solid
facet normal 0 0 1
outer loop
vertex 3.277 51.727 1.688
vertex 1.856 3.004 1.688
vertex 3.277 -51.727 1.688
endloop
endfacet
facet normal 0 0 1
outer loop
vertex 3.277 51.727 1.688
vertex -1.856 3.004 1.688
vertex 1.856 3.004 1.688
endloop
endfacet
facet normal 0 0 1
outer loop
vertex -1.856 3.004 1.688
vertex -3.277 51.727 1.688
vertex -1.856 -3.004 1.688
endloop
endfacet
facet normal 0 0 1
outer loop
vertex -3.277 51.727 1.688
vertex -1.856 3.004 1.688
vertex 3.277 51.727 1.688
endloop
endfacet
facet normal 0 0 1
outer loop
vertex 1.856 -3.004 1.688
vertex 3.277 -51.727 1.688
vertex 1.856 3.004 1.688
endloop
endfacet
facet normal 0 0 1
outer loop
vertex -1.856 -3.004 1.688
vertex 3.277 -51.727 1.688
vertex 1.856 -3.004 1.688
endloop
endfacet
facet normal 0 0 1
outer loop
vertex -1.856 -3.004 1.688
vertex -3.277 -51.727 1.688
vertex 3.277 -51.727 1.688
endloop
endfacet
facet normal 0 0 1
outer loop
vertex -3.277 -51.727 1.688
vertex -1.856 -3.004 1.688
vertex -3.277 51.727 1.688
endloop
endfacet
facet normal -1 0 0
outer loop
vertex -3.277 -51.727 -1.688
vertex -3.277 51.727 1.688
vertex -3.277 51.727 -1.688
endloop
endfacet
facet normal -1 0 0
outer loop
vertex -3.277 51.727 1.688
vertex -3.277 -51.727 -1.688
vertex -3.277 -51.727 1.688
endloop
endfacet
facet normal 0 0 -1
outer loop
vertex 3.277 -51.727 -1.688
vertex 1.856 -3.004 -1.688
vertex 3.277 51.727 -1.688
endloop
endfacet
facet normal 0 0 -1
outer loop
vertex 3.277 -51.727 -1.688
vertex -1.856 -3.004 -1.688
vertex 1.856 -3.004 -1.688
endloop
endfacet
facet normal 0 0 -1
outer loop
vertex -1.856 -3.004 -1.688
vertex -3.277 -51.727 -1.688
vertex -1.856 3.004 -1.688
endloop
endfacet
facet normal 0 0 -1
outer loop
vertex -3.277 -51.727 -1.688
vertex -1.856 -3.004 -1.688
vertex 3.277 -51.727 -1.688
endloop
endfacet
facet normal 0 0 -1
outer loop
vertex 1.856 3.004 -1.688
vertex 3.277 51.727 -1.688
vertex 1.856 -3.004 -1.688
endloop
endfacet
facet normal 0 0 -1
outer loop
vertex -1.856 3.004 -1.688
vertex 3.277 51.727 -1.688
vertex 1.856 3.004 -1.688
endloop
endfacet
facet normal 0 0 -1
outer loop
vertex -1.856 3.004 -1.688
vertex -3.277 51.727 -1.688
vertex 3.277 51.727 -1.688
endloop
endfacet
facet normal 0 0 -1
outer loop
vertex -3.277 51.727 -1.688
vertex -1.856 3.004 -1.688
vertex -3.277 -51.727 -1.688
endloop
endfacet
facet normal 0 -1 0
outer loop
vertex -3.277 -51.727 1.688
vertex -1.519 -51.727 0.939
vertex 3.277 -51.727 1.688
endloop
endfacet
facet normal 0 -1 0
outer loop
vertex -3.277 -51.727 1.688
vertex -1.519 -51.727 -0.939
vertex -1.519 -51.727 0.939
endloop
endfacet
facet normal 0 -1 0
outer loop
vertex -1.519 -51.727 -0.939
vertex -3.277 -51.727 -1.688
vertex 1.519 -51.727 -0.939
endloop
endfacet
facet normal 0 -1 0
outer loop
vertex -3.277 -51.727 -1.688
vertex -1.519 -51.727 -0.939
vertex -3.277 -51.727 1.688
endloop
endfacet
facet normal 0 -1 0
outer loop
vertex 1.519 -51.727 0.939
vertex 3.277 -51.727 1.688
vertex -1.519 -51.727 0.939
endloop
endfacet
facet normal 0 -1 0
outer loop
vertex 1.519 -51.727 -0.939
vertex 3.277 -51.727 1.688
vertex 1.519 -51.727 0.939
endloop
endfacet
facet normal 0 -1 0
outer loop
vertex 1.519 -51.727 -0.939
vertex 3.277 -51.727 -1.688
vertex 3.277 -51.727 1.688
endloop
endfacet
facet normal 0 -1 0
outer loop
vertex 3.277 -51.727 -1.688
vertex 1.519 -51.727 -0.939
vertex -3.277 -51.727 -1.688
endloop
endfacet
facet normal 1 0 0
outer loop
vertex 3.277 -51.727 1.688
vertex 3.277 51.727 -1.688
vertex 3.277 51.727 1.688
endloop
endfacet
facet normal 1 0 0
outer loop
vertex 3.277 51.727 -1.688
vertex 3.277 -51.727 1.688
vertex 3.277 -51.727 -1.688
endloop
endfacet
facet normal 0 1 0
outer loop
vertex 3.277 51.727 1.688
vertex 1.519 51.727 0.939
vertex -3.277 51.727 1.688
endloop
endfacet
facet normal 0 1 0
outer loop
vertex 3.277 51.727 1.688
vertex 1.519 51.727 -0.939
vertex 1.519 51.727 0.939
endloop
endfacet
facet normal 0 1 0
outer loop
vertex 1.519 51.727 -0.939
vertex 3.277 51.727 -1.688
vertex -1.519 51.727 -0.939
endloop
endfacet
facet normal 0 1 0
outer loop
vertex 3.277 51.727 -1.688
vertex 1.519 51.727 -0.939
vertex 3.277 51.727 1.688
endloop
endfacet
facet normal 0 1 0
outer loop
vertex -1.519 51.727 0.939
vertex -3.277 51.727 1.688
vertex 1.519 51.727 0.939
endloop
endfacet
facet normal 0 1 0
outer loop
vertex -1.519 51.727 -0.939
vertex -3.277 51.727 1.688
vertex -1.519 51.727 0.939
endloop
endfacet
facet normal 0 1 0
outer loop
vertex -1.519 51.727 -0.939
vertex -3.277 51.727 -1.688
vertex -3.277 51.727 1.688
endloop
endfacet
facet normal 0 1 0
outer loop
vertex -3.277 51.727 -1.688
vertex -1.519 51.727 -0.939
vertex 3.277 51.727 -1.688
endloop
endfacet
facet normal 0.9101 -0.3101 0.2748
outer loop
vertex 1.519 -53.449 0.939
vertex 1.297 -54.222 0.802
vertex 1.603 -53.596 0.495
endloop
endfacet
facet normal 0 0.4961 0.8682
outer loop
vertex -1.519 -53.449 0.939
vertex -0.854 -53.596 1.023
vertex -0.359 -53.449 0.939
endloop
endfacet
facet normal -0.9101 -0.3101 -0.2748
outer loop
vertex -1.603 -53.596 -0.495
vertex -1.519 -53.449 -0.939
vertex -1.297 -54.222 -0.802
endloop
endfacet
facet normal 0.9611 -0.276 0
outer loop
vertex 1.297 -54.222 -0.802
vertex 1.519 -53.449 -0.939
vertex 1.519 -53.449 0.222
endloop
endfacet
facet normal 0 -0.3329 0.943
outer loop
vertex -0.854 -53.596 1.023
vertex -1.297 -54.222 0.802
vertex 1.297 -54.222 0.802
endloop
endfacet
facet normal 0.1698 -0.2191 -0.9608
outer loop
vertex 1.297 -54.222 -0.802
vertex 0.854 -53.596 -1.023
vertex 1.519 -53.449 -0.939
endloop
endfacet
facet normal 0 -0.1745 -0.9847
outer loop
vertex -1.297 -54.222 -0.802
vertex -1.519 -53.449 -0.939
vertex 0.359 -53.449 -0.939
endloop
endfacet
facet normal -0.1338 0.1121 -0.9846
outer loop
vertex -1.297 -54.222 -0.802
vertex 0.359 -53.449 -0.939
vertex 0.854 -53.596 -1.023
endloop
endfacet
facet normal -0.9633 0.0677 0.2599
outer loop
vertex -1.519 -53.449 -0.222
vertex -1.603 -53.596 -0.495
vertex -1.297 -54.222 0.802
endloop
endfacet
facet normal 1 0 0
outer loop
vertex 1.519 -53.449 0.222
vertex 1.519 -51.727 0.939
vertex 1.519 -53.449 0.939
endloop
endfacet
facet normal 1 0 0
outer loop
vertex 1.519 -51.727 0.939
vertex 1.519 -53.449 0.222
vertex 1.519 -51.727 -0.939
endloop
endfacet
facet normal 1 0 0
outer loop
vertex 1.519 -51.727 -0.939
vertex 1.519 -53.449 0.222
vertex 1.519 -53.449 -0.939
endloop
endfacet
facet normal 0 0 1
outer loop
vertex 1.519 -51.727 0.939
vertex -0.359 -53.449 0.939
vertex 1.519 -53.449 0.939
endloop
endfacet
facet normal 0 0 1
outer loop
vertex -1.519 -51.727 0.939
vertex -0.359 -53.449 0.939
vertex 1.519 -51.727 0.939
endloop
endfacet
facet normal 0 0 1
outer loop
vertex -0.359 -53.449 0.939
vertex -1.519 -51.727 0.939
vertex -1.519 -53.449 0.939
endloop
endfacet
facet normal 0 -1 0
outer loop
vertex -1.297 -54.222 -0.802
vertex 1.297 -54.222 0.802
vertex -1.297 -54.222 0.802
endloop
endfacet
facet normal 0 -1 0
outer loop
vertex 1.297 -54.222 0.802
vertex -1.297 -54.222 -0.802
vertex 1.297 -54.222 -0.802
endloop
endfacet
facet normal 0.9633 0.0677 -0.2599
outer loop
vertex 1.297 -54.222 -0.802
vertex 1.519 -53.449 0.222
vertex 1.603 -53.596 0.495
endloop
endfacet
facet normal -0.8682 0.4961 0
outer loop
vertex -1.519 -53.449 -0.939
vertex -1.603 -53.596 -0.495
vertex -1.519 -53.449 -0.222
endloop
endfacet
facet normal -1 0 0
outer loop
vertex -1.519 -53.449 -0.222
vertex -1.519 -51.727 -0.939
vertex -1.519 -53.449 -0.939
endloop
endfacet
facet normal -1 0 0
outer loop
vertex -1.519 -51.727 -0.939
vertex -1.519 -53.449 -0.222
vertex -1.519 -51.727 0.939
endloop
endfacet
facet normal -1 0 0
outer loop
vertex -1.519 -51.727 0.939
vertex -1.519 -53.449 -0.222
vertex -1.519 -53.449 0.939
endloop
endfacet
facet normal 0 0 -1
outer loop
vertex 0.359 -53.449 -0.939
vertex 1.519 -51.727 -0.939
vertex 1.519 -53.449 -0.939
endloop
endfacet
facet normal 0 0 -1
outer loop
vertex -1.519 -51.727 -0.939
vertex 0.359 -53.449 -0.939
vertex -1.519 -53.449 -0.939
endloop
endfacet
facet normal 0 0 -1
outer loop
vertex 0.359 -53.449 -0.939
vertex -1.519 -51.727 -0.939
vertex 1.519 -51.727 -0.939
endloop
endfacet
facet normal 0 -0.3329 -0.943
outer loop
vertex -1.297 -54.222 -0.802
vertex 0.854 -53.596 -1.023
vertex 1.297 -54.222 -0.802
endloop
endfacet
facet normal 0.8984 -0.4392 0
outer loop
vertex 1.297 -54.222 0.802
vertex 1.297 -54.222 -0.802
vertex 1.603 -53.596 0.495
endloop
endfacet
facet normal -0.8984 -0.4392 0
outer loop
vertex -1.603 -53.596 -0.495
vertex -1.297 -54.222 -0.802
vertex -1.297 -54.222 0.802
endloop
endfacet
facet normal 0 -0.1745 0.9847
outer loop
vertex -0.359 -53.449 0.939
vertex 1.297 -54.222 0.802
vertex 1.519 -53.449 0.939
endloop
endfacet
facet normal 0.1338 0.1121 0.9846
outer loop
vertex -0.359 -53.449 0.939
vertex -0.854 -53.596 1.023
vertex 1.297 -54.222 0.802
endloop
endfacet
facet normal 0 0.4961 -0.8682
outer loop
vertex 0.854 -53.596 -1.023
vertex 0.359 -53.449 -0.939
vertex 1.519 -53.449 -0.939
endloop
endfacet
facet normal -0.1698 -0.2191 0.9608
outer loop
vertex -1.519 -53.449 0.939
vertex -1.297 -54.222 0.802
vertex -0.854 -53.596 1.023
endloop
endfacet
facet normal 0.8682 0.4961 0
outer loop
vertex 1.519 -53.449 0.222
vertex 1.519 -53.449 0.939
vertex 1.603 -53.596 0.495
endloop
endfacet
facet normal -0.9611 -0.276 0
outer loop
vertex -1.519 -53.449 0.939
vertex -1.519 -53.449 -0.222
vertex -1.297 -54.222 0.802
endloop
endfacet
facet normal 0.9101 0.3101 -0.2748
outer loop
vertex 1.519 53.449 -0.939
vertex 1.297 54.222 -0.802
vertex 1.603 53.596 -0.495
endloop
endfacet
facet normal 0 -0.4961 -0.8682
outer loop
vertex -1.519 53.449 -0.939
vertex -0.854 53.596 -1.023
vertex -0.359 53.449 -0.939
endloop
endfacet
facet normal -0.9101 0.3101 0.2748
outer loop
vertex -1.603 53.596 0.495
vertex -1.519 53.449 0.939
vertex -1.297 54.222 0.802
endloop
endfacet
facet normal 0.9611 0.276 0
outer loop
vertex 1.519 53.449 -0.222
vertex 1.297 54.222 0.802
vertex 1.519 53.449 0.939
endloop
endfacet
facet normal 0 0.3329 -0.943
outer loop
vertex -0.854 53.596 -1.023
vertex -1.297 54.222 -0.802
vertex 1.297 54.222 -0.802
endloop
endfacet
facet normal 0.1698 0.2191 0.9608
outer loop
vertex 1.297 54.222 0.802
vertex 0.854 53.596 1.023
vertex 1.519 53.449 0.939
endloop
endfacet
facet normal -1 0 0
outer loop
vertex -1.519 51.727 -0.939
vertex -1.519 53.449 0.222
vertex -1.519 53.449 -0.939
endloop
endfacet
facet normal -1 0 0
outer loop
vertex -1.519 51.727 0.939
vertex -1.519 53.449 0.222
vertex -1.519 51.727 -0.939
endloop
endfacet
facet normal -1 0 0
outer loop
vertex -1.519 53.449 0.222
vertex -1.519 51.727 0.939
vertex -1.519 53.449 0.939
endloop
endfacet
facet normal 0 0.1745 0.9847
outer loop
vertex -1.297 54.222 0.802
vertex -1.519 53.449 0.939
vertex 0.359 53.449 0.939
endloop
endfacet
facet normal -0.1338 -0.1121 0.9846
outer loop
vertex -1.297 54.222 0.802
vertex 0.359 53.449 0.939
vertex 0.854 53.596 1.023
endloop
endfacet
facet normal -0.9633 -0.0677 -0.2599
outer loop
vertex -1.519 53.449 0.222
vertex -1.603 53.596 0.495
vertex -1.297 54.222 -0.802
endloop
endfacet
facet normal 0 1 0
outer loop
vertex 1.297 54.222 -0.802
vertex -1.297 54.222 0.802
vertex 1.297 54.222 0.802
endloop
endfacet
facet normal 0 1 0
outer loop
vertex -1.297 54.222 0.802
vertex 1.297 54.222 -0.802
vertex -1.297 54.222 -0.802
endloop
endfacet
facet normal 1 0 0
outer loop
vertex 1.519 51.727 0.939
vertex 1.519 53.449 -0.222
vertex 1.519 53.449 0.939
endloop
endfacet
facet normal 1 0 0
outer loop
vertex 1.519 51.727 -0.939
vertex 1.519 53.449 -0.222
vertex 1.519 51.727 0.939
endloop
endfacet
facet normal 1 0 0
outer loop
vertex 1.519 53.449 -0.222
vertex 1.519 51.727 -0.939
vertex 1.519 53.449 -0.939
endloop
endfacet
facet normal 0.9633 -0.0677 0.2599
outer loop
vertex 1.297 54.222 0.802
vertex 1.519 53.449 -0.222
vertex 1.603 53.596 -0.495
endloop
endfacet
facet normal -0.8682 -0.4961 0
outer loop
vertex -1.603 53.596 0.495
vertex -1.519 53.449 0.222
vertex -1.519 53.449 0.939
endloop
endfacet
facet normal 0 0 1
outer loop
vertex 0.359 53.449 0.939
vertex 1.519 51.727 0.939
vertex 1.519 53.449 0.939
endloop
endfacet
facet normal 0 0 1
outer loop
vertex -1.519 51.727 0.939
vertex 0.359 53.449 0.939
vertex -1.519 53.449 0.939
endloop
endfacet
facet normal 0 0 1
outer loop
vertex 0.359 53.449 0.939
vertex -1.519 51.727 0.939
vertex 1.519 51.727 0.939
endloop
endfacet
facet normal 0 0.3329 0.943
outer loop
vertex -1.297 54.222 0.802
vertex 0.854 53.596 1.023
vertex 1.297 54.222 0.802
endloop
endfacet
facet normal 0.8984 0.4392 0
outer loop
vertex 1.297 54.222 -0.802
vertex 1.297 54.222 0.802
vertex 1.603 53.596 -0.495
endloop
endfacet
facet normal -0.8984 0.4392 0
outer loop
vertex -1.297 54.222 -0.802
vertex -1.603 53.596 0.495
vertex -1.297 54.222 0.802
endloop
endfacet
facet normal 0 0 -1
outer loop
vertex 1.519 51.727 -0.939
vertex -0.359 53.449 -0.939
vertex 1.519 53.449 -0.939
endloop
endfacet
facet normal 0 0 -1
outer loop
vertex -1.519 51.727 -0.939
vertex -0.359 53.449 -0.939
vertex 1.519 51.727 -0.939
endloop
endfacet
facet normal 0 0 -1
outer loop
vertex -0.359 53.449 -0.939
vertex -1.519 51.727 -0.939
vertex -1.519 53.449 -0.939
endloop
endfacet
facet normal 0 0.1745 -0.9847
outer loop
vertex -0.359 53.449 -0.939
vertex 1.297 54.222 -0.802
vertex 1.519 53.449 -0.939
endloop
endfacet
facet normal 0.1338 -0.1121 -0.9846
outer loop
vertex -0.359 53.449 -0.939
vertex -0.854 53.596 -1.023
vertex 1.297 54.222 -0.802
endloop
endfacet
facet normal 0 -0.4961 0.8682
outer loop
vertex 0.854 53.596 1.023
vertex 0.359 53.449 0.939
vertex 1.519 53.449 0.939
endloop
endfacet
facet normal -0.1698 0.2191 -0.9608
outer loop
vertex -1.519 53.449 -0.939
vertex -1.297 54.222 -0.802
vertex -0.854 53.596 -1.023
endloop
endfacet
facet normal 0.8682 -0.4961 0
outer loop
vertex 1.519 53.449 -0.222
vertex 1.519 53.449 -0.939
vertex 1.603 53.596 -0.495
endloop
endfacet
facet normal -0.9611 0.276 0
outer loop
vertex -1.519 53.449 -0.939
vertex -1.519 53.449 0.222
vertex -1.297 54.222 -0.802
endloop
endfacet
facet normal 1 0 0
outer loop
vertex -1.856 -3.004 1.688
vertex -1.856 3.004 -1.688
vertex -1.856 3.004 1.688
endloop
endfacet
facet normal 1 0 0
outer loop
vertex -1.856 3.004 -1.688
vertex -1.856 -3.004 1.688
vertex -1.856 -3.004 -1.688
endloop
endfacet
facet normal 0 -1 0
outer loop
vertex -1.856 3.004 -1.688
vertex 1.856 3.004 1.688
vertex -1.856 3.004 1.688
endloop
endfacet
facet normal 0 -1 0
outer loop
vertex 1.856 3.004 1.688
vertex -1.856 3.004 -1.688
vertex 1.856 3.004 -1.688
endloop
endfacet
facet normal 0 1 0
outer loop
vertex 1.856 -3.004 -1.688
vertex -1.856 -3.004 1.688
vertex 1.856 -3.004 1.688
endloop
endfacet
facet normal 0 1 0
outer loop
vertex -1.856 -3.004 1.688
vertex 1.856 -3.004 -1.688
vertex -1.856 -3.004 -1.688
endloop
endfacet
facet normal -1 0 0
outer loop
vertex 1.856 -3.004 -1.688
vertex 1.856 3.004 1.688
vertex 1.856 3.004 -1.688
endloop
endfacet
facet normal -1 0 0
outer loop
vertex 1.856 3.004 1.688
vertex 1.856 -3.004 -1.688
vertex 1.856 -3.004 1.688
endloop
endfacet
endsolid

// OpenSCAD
sc=(4+2*sqrt(5))/cos(16.5);
points=[[ -0.309016994374947, -0.190983005625053, -5.85410196624968 ],[ -0.309016994374947, -0.190983005625053, 5.85410196624968 ],[ -0.309016994374947, 0.190983005625053, -5.85410196624968 ],[ -0.309016994374947, 0.190983005625053, 5.85410196624968 ],[ -0.201626123751154, -0.0623058987490541, 6.25328890437411 ],[ -0.190983005625053, -4.23606797749979, -0.309016994374947 ],[ -0.190983005625053, -4.23606797749979, 0.309016994374947 ],[ -0.190983005625053, -0.118033988749895, 5.85410196624968 ],[ -0.190983005625053, -0.118033988749895, 6.23606797749979 ],[ -0.190983005625053, -0.0278640450004204, 6.23606797749979 ],[ -0.190983005625053, 0.118033988749895, 5.85410196624968 ],[ -0.190983005625053, 0.118033988749895, 6.23606797749979 ],[ -0.190983005625053, 4.23606797749979, -0.309016994374947 ],[ -0.190983005625053, 4.23606797749979, 0.309016994374947 ],[ -0.163118960624632, -0.100813061875577, 6.32623792124926 ],[ -0.163118960624632, 0.100813061875577, 6.32623792124926 ],[ -0.107390870623792, 0.128677106875998, 6.25328890437411 ],[ -0.0450849718747373, 0.118033988749895, 6.23606797749979 ],[ 0, -5.23606797749979, 0 ],[ 0, 0, -6.85410196624968 ],[ 0, 0, 0 ],[ 0, 0, 6.85410196624968 ],[ 0, 5.23606797749979, 0 ],[ 0.0450849718747373, -0.118033988749895, 6.23606797749979 ],[ 0.107390870623792, -0.128677106875998, 6.25328890437411 ],[ 0.163118960624632, -0.100813061875577, 6.32623792124926 ],[ 0.163118960624632, 0.100813061875577, 6.32623792124926 ],[ 0.190983005625053, -4.23606797749979, -0.309016994374947 ],[ 0.190983005625053, -4.23606797749979, 0.309016994374947 ],[ 0.190983005625053, -0.118033988749895, 5.85410196624968 ],[ 0.190983005625053, -0.118033988749895, 6.23606797749979 ],[ 0.190983005625053, 0.0278640450004204, 6.23606797749979 ],[ 0.190983005625053, 0.118033988749895, 5.85410196624968 ],[ 0.190983005625053, 0.118033988749895, 6.23606797749979 ],[ 0.190983005625053, 4.23606797749979, -0.309016994374947 ],[ 0.190983005625053, 4.23606797749979, 0.309016994374947 ],[ 0.201626123751154, 0.0623058987490541, 6.25328890437411 ],[ 0.309016994374947, -0.190983005625053, -5.85410196624968 ],[ 0.309016994374947, -0.190983005625053, 5.85410196624968 ],[ 0.309016994374947, 0.190983005625053, -5.85410196624968 ],[ 0.309016994374947, 0.190983005625053, 5.85410196624968 ]];

module tip(thinner=0.9,shorter=0.97) {
    scale([thinner,thinner,shorter]) polyhedron(points,faces=[[ 17, 32, 33 ],[ 8, 4, 14 ],[ 24, 30, 23 ],[ 33, 36, 26 ],[ 9, 11, 15 ],[ 14, 25, 24 ],[ 15, 11, 16 ],[ 7, 10, 9 ],[ 32, 31, 33 ],[ 17, 33, 26 ],[ 16, 17, 26 ],[ 10, 32, 17 ],[ 36, 31, 25 ],[ 7, 9, 8 ],[ 29, 7, 23 ],[ 14, 15, 26, 25 ],[ 10, 11, 9 ],[ 29, 30, 31 ],[ 30, 29, 23 ],[ 4, 9, 15 ],[ 36, 33, 31 ],[ 32, 29, 31 ],[ 11, 10, 17 ],[ 26, 15, 16 ],[ 29, 32, 10, 7 ],[ 14, 4, 15 ],[ 26, 36, 25 ],[ 23, 7, 8 ],[ 23, 8, 14 ],[ 24, 23, 14 ],[ 16, 11, 17 ],[ 25, 30, 24 ],[ 4, 8, 9 ],[ 31, 30, 25 ]]);
}

broader=1.2;
spacious=1.1;
scale(sc) rotate([90,90,0]) rotate([0,0,-90]) difference () {
render() {
    scale([broader,1,1]) polyhedron(points,faces=[[ 1, 38, 37, 0 ],[ 38, 1, 3, 40 ],[ 39, 37, 38, 40 ],[ 3, 2, 39, 40 ],[ 2, 3, 1, 0 ],[ 37, 39, 2, 0 ]]);
    tip();
    rotate([180,0,0]) tip();
    }
scale([spacious,1,spacious]) polyhedron(points,faces=[[ 34, 12, 5, 27 ],[ 28, 6, 13, 35 ],[ 28, 35, 34, 27 ],[ 5, 6, 28, 27 ],[ 13, 12, 34, 35 ],[ 5, 12, 13, 6 ]]);
}
